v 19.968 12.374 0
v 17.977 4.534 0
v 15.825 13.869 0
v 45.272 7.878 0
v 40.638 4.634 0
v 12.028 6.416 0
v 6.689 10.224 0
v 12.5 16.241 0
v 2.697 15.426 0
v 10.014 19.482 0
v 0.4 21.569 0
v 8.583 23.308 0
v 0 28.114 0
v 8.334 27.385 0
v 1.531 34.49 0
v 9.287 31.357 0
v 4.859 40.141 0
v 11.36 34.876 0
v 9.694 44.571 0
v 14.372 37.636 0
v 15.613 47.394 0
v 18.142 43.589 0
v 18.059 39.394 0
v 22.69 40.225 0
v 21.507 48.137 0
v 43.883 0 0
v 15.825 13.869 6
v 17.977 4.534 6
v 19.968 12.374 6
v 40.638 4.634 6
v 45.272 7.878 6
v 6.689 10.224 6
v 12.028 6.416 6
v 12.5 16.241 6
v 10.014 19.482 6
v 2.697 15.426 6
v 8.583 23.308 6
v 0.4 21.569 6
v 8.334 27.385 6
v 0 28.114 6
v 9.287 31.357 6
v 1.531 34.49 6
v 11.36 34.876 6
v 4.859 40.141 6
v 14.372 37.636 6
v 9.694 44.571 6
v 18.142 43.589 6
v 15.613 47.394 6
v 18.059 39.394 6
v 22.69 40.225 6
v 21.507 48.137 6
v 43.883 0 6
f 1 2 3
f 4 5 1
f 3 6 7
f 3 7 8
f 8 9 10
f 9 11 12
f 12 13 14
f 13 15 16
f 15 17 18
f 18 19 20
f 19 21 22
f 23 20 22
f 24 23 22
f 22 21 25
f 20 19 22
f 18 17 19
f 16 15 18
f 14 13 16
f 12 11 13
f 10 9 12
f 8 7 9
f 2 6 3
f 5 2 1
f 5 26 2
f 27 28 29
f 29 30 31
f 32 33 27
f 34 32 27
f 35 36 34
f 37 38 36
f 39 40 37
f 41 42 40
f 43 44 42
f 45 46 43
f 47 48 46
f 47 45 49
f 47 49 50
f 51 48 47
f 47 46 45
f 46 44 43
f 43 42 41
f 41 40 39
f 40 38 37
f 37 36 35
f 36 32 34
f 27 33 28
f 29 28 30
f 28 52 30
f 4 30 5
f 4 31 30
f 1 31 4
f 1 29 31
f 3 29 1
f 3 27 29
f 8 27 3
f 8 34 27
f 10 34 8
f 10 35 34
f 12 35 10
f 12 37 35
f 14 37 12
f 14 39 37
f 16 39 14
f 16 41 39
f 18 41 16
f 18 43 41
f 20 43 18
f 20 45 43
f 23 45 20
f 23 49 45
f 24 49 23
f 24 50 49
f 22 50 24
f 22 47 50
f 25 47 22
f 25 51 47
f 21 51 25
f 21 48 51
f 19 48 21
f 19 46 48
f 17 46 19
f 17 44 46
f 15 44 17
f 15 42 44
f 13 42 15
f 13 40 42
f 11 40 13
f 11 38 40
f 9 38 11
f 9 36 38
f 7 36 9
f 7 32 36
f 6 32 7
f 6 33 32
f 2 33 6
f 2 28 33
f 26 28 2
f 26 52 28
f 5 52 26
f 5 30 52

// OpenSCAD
$fn = 32;

// ----------------------------------------------------------------------
// Hook plate: curl radius 18 mm over 170 degrees, 8 mm thick band
// ----------------------------------------------------------------------

// --- parameters (mm) ---
profile_height = 6;       // extrusion height
profile_points = 26;      // points of the closed outline

profile = [[18.142, 43.589], [21.507, 48.137], [15.613, 47.394], [9.694, 44.571], [4.859, 40.141], [1.531, 34.49], [0, 28.114], [0.4, 21.569], [2.697, 15.426], [6.689, 10.224], [12.028, 6.416], [17.977, 4.534], [43.883, 0], [40.638, 4.634], [45.272, 7.878], [19.968, 12.374], [15.825, 13.869], [12.5, 16.241], [10.014, 19.482], [8.583, 23.308], [8.334, 27.385], [9.287, 31.357], [11.36, 34.876], [14.372, 37.636], [18.059, 39.394], [22.69, 40.225]];  // single closed polygon, 26 points, counter clockwise

// --- the one profile operation ---
linear_extrude(height = profile_height) polygon(points = profile);
